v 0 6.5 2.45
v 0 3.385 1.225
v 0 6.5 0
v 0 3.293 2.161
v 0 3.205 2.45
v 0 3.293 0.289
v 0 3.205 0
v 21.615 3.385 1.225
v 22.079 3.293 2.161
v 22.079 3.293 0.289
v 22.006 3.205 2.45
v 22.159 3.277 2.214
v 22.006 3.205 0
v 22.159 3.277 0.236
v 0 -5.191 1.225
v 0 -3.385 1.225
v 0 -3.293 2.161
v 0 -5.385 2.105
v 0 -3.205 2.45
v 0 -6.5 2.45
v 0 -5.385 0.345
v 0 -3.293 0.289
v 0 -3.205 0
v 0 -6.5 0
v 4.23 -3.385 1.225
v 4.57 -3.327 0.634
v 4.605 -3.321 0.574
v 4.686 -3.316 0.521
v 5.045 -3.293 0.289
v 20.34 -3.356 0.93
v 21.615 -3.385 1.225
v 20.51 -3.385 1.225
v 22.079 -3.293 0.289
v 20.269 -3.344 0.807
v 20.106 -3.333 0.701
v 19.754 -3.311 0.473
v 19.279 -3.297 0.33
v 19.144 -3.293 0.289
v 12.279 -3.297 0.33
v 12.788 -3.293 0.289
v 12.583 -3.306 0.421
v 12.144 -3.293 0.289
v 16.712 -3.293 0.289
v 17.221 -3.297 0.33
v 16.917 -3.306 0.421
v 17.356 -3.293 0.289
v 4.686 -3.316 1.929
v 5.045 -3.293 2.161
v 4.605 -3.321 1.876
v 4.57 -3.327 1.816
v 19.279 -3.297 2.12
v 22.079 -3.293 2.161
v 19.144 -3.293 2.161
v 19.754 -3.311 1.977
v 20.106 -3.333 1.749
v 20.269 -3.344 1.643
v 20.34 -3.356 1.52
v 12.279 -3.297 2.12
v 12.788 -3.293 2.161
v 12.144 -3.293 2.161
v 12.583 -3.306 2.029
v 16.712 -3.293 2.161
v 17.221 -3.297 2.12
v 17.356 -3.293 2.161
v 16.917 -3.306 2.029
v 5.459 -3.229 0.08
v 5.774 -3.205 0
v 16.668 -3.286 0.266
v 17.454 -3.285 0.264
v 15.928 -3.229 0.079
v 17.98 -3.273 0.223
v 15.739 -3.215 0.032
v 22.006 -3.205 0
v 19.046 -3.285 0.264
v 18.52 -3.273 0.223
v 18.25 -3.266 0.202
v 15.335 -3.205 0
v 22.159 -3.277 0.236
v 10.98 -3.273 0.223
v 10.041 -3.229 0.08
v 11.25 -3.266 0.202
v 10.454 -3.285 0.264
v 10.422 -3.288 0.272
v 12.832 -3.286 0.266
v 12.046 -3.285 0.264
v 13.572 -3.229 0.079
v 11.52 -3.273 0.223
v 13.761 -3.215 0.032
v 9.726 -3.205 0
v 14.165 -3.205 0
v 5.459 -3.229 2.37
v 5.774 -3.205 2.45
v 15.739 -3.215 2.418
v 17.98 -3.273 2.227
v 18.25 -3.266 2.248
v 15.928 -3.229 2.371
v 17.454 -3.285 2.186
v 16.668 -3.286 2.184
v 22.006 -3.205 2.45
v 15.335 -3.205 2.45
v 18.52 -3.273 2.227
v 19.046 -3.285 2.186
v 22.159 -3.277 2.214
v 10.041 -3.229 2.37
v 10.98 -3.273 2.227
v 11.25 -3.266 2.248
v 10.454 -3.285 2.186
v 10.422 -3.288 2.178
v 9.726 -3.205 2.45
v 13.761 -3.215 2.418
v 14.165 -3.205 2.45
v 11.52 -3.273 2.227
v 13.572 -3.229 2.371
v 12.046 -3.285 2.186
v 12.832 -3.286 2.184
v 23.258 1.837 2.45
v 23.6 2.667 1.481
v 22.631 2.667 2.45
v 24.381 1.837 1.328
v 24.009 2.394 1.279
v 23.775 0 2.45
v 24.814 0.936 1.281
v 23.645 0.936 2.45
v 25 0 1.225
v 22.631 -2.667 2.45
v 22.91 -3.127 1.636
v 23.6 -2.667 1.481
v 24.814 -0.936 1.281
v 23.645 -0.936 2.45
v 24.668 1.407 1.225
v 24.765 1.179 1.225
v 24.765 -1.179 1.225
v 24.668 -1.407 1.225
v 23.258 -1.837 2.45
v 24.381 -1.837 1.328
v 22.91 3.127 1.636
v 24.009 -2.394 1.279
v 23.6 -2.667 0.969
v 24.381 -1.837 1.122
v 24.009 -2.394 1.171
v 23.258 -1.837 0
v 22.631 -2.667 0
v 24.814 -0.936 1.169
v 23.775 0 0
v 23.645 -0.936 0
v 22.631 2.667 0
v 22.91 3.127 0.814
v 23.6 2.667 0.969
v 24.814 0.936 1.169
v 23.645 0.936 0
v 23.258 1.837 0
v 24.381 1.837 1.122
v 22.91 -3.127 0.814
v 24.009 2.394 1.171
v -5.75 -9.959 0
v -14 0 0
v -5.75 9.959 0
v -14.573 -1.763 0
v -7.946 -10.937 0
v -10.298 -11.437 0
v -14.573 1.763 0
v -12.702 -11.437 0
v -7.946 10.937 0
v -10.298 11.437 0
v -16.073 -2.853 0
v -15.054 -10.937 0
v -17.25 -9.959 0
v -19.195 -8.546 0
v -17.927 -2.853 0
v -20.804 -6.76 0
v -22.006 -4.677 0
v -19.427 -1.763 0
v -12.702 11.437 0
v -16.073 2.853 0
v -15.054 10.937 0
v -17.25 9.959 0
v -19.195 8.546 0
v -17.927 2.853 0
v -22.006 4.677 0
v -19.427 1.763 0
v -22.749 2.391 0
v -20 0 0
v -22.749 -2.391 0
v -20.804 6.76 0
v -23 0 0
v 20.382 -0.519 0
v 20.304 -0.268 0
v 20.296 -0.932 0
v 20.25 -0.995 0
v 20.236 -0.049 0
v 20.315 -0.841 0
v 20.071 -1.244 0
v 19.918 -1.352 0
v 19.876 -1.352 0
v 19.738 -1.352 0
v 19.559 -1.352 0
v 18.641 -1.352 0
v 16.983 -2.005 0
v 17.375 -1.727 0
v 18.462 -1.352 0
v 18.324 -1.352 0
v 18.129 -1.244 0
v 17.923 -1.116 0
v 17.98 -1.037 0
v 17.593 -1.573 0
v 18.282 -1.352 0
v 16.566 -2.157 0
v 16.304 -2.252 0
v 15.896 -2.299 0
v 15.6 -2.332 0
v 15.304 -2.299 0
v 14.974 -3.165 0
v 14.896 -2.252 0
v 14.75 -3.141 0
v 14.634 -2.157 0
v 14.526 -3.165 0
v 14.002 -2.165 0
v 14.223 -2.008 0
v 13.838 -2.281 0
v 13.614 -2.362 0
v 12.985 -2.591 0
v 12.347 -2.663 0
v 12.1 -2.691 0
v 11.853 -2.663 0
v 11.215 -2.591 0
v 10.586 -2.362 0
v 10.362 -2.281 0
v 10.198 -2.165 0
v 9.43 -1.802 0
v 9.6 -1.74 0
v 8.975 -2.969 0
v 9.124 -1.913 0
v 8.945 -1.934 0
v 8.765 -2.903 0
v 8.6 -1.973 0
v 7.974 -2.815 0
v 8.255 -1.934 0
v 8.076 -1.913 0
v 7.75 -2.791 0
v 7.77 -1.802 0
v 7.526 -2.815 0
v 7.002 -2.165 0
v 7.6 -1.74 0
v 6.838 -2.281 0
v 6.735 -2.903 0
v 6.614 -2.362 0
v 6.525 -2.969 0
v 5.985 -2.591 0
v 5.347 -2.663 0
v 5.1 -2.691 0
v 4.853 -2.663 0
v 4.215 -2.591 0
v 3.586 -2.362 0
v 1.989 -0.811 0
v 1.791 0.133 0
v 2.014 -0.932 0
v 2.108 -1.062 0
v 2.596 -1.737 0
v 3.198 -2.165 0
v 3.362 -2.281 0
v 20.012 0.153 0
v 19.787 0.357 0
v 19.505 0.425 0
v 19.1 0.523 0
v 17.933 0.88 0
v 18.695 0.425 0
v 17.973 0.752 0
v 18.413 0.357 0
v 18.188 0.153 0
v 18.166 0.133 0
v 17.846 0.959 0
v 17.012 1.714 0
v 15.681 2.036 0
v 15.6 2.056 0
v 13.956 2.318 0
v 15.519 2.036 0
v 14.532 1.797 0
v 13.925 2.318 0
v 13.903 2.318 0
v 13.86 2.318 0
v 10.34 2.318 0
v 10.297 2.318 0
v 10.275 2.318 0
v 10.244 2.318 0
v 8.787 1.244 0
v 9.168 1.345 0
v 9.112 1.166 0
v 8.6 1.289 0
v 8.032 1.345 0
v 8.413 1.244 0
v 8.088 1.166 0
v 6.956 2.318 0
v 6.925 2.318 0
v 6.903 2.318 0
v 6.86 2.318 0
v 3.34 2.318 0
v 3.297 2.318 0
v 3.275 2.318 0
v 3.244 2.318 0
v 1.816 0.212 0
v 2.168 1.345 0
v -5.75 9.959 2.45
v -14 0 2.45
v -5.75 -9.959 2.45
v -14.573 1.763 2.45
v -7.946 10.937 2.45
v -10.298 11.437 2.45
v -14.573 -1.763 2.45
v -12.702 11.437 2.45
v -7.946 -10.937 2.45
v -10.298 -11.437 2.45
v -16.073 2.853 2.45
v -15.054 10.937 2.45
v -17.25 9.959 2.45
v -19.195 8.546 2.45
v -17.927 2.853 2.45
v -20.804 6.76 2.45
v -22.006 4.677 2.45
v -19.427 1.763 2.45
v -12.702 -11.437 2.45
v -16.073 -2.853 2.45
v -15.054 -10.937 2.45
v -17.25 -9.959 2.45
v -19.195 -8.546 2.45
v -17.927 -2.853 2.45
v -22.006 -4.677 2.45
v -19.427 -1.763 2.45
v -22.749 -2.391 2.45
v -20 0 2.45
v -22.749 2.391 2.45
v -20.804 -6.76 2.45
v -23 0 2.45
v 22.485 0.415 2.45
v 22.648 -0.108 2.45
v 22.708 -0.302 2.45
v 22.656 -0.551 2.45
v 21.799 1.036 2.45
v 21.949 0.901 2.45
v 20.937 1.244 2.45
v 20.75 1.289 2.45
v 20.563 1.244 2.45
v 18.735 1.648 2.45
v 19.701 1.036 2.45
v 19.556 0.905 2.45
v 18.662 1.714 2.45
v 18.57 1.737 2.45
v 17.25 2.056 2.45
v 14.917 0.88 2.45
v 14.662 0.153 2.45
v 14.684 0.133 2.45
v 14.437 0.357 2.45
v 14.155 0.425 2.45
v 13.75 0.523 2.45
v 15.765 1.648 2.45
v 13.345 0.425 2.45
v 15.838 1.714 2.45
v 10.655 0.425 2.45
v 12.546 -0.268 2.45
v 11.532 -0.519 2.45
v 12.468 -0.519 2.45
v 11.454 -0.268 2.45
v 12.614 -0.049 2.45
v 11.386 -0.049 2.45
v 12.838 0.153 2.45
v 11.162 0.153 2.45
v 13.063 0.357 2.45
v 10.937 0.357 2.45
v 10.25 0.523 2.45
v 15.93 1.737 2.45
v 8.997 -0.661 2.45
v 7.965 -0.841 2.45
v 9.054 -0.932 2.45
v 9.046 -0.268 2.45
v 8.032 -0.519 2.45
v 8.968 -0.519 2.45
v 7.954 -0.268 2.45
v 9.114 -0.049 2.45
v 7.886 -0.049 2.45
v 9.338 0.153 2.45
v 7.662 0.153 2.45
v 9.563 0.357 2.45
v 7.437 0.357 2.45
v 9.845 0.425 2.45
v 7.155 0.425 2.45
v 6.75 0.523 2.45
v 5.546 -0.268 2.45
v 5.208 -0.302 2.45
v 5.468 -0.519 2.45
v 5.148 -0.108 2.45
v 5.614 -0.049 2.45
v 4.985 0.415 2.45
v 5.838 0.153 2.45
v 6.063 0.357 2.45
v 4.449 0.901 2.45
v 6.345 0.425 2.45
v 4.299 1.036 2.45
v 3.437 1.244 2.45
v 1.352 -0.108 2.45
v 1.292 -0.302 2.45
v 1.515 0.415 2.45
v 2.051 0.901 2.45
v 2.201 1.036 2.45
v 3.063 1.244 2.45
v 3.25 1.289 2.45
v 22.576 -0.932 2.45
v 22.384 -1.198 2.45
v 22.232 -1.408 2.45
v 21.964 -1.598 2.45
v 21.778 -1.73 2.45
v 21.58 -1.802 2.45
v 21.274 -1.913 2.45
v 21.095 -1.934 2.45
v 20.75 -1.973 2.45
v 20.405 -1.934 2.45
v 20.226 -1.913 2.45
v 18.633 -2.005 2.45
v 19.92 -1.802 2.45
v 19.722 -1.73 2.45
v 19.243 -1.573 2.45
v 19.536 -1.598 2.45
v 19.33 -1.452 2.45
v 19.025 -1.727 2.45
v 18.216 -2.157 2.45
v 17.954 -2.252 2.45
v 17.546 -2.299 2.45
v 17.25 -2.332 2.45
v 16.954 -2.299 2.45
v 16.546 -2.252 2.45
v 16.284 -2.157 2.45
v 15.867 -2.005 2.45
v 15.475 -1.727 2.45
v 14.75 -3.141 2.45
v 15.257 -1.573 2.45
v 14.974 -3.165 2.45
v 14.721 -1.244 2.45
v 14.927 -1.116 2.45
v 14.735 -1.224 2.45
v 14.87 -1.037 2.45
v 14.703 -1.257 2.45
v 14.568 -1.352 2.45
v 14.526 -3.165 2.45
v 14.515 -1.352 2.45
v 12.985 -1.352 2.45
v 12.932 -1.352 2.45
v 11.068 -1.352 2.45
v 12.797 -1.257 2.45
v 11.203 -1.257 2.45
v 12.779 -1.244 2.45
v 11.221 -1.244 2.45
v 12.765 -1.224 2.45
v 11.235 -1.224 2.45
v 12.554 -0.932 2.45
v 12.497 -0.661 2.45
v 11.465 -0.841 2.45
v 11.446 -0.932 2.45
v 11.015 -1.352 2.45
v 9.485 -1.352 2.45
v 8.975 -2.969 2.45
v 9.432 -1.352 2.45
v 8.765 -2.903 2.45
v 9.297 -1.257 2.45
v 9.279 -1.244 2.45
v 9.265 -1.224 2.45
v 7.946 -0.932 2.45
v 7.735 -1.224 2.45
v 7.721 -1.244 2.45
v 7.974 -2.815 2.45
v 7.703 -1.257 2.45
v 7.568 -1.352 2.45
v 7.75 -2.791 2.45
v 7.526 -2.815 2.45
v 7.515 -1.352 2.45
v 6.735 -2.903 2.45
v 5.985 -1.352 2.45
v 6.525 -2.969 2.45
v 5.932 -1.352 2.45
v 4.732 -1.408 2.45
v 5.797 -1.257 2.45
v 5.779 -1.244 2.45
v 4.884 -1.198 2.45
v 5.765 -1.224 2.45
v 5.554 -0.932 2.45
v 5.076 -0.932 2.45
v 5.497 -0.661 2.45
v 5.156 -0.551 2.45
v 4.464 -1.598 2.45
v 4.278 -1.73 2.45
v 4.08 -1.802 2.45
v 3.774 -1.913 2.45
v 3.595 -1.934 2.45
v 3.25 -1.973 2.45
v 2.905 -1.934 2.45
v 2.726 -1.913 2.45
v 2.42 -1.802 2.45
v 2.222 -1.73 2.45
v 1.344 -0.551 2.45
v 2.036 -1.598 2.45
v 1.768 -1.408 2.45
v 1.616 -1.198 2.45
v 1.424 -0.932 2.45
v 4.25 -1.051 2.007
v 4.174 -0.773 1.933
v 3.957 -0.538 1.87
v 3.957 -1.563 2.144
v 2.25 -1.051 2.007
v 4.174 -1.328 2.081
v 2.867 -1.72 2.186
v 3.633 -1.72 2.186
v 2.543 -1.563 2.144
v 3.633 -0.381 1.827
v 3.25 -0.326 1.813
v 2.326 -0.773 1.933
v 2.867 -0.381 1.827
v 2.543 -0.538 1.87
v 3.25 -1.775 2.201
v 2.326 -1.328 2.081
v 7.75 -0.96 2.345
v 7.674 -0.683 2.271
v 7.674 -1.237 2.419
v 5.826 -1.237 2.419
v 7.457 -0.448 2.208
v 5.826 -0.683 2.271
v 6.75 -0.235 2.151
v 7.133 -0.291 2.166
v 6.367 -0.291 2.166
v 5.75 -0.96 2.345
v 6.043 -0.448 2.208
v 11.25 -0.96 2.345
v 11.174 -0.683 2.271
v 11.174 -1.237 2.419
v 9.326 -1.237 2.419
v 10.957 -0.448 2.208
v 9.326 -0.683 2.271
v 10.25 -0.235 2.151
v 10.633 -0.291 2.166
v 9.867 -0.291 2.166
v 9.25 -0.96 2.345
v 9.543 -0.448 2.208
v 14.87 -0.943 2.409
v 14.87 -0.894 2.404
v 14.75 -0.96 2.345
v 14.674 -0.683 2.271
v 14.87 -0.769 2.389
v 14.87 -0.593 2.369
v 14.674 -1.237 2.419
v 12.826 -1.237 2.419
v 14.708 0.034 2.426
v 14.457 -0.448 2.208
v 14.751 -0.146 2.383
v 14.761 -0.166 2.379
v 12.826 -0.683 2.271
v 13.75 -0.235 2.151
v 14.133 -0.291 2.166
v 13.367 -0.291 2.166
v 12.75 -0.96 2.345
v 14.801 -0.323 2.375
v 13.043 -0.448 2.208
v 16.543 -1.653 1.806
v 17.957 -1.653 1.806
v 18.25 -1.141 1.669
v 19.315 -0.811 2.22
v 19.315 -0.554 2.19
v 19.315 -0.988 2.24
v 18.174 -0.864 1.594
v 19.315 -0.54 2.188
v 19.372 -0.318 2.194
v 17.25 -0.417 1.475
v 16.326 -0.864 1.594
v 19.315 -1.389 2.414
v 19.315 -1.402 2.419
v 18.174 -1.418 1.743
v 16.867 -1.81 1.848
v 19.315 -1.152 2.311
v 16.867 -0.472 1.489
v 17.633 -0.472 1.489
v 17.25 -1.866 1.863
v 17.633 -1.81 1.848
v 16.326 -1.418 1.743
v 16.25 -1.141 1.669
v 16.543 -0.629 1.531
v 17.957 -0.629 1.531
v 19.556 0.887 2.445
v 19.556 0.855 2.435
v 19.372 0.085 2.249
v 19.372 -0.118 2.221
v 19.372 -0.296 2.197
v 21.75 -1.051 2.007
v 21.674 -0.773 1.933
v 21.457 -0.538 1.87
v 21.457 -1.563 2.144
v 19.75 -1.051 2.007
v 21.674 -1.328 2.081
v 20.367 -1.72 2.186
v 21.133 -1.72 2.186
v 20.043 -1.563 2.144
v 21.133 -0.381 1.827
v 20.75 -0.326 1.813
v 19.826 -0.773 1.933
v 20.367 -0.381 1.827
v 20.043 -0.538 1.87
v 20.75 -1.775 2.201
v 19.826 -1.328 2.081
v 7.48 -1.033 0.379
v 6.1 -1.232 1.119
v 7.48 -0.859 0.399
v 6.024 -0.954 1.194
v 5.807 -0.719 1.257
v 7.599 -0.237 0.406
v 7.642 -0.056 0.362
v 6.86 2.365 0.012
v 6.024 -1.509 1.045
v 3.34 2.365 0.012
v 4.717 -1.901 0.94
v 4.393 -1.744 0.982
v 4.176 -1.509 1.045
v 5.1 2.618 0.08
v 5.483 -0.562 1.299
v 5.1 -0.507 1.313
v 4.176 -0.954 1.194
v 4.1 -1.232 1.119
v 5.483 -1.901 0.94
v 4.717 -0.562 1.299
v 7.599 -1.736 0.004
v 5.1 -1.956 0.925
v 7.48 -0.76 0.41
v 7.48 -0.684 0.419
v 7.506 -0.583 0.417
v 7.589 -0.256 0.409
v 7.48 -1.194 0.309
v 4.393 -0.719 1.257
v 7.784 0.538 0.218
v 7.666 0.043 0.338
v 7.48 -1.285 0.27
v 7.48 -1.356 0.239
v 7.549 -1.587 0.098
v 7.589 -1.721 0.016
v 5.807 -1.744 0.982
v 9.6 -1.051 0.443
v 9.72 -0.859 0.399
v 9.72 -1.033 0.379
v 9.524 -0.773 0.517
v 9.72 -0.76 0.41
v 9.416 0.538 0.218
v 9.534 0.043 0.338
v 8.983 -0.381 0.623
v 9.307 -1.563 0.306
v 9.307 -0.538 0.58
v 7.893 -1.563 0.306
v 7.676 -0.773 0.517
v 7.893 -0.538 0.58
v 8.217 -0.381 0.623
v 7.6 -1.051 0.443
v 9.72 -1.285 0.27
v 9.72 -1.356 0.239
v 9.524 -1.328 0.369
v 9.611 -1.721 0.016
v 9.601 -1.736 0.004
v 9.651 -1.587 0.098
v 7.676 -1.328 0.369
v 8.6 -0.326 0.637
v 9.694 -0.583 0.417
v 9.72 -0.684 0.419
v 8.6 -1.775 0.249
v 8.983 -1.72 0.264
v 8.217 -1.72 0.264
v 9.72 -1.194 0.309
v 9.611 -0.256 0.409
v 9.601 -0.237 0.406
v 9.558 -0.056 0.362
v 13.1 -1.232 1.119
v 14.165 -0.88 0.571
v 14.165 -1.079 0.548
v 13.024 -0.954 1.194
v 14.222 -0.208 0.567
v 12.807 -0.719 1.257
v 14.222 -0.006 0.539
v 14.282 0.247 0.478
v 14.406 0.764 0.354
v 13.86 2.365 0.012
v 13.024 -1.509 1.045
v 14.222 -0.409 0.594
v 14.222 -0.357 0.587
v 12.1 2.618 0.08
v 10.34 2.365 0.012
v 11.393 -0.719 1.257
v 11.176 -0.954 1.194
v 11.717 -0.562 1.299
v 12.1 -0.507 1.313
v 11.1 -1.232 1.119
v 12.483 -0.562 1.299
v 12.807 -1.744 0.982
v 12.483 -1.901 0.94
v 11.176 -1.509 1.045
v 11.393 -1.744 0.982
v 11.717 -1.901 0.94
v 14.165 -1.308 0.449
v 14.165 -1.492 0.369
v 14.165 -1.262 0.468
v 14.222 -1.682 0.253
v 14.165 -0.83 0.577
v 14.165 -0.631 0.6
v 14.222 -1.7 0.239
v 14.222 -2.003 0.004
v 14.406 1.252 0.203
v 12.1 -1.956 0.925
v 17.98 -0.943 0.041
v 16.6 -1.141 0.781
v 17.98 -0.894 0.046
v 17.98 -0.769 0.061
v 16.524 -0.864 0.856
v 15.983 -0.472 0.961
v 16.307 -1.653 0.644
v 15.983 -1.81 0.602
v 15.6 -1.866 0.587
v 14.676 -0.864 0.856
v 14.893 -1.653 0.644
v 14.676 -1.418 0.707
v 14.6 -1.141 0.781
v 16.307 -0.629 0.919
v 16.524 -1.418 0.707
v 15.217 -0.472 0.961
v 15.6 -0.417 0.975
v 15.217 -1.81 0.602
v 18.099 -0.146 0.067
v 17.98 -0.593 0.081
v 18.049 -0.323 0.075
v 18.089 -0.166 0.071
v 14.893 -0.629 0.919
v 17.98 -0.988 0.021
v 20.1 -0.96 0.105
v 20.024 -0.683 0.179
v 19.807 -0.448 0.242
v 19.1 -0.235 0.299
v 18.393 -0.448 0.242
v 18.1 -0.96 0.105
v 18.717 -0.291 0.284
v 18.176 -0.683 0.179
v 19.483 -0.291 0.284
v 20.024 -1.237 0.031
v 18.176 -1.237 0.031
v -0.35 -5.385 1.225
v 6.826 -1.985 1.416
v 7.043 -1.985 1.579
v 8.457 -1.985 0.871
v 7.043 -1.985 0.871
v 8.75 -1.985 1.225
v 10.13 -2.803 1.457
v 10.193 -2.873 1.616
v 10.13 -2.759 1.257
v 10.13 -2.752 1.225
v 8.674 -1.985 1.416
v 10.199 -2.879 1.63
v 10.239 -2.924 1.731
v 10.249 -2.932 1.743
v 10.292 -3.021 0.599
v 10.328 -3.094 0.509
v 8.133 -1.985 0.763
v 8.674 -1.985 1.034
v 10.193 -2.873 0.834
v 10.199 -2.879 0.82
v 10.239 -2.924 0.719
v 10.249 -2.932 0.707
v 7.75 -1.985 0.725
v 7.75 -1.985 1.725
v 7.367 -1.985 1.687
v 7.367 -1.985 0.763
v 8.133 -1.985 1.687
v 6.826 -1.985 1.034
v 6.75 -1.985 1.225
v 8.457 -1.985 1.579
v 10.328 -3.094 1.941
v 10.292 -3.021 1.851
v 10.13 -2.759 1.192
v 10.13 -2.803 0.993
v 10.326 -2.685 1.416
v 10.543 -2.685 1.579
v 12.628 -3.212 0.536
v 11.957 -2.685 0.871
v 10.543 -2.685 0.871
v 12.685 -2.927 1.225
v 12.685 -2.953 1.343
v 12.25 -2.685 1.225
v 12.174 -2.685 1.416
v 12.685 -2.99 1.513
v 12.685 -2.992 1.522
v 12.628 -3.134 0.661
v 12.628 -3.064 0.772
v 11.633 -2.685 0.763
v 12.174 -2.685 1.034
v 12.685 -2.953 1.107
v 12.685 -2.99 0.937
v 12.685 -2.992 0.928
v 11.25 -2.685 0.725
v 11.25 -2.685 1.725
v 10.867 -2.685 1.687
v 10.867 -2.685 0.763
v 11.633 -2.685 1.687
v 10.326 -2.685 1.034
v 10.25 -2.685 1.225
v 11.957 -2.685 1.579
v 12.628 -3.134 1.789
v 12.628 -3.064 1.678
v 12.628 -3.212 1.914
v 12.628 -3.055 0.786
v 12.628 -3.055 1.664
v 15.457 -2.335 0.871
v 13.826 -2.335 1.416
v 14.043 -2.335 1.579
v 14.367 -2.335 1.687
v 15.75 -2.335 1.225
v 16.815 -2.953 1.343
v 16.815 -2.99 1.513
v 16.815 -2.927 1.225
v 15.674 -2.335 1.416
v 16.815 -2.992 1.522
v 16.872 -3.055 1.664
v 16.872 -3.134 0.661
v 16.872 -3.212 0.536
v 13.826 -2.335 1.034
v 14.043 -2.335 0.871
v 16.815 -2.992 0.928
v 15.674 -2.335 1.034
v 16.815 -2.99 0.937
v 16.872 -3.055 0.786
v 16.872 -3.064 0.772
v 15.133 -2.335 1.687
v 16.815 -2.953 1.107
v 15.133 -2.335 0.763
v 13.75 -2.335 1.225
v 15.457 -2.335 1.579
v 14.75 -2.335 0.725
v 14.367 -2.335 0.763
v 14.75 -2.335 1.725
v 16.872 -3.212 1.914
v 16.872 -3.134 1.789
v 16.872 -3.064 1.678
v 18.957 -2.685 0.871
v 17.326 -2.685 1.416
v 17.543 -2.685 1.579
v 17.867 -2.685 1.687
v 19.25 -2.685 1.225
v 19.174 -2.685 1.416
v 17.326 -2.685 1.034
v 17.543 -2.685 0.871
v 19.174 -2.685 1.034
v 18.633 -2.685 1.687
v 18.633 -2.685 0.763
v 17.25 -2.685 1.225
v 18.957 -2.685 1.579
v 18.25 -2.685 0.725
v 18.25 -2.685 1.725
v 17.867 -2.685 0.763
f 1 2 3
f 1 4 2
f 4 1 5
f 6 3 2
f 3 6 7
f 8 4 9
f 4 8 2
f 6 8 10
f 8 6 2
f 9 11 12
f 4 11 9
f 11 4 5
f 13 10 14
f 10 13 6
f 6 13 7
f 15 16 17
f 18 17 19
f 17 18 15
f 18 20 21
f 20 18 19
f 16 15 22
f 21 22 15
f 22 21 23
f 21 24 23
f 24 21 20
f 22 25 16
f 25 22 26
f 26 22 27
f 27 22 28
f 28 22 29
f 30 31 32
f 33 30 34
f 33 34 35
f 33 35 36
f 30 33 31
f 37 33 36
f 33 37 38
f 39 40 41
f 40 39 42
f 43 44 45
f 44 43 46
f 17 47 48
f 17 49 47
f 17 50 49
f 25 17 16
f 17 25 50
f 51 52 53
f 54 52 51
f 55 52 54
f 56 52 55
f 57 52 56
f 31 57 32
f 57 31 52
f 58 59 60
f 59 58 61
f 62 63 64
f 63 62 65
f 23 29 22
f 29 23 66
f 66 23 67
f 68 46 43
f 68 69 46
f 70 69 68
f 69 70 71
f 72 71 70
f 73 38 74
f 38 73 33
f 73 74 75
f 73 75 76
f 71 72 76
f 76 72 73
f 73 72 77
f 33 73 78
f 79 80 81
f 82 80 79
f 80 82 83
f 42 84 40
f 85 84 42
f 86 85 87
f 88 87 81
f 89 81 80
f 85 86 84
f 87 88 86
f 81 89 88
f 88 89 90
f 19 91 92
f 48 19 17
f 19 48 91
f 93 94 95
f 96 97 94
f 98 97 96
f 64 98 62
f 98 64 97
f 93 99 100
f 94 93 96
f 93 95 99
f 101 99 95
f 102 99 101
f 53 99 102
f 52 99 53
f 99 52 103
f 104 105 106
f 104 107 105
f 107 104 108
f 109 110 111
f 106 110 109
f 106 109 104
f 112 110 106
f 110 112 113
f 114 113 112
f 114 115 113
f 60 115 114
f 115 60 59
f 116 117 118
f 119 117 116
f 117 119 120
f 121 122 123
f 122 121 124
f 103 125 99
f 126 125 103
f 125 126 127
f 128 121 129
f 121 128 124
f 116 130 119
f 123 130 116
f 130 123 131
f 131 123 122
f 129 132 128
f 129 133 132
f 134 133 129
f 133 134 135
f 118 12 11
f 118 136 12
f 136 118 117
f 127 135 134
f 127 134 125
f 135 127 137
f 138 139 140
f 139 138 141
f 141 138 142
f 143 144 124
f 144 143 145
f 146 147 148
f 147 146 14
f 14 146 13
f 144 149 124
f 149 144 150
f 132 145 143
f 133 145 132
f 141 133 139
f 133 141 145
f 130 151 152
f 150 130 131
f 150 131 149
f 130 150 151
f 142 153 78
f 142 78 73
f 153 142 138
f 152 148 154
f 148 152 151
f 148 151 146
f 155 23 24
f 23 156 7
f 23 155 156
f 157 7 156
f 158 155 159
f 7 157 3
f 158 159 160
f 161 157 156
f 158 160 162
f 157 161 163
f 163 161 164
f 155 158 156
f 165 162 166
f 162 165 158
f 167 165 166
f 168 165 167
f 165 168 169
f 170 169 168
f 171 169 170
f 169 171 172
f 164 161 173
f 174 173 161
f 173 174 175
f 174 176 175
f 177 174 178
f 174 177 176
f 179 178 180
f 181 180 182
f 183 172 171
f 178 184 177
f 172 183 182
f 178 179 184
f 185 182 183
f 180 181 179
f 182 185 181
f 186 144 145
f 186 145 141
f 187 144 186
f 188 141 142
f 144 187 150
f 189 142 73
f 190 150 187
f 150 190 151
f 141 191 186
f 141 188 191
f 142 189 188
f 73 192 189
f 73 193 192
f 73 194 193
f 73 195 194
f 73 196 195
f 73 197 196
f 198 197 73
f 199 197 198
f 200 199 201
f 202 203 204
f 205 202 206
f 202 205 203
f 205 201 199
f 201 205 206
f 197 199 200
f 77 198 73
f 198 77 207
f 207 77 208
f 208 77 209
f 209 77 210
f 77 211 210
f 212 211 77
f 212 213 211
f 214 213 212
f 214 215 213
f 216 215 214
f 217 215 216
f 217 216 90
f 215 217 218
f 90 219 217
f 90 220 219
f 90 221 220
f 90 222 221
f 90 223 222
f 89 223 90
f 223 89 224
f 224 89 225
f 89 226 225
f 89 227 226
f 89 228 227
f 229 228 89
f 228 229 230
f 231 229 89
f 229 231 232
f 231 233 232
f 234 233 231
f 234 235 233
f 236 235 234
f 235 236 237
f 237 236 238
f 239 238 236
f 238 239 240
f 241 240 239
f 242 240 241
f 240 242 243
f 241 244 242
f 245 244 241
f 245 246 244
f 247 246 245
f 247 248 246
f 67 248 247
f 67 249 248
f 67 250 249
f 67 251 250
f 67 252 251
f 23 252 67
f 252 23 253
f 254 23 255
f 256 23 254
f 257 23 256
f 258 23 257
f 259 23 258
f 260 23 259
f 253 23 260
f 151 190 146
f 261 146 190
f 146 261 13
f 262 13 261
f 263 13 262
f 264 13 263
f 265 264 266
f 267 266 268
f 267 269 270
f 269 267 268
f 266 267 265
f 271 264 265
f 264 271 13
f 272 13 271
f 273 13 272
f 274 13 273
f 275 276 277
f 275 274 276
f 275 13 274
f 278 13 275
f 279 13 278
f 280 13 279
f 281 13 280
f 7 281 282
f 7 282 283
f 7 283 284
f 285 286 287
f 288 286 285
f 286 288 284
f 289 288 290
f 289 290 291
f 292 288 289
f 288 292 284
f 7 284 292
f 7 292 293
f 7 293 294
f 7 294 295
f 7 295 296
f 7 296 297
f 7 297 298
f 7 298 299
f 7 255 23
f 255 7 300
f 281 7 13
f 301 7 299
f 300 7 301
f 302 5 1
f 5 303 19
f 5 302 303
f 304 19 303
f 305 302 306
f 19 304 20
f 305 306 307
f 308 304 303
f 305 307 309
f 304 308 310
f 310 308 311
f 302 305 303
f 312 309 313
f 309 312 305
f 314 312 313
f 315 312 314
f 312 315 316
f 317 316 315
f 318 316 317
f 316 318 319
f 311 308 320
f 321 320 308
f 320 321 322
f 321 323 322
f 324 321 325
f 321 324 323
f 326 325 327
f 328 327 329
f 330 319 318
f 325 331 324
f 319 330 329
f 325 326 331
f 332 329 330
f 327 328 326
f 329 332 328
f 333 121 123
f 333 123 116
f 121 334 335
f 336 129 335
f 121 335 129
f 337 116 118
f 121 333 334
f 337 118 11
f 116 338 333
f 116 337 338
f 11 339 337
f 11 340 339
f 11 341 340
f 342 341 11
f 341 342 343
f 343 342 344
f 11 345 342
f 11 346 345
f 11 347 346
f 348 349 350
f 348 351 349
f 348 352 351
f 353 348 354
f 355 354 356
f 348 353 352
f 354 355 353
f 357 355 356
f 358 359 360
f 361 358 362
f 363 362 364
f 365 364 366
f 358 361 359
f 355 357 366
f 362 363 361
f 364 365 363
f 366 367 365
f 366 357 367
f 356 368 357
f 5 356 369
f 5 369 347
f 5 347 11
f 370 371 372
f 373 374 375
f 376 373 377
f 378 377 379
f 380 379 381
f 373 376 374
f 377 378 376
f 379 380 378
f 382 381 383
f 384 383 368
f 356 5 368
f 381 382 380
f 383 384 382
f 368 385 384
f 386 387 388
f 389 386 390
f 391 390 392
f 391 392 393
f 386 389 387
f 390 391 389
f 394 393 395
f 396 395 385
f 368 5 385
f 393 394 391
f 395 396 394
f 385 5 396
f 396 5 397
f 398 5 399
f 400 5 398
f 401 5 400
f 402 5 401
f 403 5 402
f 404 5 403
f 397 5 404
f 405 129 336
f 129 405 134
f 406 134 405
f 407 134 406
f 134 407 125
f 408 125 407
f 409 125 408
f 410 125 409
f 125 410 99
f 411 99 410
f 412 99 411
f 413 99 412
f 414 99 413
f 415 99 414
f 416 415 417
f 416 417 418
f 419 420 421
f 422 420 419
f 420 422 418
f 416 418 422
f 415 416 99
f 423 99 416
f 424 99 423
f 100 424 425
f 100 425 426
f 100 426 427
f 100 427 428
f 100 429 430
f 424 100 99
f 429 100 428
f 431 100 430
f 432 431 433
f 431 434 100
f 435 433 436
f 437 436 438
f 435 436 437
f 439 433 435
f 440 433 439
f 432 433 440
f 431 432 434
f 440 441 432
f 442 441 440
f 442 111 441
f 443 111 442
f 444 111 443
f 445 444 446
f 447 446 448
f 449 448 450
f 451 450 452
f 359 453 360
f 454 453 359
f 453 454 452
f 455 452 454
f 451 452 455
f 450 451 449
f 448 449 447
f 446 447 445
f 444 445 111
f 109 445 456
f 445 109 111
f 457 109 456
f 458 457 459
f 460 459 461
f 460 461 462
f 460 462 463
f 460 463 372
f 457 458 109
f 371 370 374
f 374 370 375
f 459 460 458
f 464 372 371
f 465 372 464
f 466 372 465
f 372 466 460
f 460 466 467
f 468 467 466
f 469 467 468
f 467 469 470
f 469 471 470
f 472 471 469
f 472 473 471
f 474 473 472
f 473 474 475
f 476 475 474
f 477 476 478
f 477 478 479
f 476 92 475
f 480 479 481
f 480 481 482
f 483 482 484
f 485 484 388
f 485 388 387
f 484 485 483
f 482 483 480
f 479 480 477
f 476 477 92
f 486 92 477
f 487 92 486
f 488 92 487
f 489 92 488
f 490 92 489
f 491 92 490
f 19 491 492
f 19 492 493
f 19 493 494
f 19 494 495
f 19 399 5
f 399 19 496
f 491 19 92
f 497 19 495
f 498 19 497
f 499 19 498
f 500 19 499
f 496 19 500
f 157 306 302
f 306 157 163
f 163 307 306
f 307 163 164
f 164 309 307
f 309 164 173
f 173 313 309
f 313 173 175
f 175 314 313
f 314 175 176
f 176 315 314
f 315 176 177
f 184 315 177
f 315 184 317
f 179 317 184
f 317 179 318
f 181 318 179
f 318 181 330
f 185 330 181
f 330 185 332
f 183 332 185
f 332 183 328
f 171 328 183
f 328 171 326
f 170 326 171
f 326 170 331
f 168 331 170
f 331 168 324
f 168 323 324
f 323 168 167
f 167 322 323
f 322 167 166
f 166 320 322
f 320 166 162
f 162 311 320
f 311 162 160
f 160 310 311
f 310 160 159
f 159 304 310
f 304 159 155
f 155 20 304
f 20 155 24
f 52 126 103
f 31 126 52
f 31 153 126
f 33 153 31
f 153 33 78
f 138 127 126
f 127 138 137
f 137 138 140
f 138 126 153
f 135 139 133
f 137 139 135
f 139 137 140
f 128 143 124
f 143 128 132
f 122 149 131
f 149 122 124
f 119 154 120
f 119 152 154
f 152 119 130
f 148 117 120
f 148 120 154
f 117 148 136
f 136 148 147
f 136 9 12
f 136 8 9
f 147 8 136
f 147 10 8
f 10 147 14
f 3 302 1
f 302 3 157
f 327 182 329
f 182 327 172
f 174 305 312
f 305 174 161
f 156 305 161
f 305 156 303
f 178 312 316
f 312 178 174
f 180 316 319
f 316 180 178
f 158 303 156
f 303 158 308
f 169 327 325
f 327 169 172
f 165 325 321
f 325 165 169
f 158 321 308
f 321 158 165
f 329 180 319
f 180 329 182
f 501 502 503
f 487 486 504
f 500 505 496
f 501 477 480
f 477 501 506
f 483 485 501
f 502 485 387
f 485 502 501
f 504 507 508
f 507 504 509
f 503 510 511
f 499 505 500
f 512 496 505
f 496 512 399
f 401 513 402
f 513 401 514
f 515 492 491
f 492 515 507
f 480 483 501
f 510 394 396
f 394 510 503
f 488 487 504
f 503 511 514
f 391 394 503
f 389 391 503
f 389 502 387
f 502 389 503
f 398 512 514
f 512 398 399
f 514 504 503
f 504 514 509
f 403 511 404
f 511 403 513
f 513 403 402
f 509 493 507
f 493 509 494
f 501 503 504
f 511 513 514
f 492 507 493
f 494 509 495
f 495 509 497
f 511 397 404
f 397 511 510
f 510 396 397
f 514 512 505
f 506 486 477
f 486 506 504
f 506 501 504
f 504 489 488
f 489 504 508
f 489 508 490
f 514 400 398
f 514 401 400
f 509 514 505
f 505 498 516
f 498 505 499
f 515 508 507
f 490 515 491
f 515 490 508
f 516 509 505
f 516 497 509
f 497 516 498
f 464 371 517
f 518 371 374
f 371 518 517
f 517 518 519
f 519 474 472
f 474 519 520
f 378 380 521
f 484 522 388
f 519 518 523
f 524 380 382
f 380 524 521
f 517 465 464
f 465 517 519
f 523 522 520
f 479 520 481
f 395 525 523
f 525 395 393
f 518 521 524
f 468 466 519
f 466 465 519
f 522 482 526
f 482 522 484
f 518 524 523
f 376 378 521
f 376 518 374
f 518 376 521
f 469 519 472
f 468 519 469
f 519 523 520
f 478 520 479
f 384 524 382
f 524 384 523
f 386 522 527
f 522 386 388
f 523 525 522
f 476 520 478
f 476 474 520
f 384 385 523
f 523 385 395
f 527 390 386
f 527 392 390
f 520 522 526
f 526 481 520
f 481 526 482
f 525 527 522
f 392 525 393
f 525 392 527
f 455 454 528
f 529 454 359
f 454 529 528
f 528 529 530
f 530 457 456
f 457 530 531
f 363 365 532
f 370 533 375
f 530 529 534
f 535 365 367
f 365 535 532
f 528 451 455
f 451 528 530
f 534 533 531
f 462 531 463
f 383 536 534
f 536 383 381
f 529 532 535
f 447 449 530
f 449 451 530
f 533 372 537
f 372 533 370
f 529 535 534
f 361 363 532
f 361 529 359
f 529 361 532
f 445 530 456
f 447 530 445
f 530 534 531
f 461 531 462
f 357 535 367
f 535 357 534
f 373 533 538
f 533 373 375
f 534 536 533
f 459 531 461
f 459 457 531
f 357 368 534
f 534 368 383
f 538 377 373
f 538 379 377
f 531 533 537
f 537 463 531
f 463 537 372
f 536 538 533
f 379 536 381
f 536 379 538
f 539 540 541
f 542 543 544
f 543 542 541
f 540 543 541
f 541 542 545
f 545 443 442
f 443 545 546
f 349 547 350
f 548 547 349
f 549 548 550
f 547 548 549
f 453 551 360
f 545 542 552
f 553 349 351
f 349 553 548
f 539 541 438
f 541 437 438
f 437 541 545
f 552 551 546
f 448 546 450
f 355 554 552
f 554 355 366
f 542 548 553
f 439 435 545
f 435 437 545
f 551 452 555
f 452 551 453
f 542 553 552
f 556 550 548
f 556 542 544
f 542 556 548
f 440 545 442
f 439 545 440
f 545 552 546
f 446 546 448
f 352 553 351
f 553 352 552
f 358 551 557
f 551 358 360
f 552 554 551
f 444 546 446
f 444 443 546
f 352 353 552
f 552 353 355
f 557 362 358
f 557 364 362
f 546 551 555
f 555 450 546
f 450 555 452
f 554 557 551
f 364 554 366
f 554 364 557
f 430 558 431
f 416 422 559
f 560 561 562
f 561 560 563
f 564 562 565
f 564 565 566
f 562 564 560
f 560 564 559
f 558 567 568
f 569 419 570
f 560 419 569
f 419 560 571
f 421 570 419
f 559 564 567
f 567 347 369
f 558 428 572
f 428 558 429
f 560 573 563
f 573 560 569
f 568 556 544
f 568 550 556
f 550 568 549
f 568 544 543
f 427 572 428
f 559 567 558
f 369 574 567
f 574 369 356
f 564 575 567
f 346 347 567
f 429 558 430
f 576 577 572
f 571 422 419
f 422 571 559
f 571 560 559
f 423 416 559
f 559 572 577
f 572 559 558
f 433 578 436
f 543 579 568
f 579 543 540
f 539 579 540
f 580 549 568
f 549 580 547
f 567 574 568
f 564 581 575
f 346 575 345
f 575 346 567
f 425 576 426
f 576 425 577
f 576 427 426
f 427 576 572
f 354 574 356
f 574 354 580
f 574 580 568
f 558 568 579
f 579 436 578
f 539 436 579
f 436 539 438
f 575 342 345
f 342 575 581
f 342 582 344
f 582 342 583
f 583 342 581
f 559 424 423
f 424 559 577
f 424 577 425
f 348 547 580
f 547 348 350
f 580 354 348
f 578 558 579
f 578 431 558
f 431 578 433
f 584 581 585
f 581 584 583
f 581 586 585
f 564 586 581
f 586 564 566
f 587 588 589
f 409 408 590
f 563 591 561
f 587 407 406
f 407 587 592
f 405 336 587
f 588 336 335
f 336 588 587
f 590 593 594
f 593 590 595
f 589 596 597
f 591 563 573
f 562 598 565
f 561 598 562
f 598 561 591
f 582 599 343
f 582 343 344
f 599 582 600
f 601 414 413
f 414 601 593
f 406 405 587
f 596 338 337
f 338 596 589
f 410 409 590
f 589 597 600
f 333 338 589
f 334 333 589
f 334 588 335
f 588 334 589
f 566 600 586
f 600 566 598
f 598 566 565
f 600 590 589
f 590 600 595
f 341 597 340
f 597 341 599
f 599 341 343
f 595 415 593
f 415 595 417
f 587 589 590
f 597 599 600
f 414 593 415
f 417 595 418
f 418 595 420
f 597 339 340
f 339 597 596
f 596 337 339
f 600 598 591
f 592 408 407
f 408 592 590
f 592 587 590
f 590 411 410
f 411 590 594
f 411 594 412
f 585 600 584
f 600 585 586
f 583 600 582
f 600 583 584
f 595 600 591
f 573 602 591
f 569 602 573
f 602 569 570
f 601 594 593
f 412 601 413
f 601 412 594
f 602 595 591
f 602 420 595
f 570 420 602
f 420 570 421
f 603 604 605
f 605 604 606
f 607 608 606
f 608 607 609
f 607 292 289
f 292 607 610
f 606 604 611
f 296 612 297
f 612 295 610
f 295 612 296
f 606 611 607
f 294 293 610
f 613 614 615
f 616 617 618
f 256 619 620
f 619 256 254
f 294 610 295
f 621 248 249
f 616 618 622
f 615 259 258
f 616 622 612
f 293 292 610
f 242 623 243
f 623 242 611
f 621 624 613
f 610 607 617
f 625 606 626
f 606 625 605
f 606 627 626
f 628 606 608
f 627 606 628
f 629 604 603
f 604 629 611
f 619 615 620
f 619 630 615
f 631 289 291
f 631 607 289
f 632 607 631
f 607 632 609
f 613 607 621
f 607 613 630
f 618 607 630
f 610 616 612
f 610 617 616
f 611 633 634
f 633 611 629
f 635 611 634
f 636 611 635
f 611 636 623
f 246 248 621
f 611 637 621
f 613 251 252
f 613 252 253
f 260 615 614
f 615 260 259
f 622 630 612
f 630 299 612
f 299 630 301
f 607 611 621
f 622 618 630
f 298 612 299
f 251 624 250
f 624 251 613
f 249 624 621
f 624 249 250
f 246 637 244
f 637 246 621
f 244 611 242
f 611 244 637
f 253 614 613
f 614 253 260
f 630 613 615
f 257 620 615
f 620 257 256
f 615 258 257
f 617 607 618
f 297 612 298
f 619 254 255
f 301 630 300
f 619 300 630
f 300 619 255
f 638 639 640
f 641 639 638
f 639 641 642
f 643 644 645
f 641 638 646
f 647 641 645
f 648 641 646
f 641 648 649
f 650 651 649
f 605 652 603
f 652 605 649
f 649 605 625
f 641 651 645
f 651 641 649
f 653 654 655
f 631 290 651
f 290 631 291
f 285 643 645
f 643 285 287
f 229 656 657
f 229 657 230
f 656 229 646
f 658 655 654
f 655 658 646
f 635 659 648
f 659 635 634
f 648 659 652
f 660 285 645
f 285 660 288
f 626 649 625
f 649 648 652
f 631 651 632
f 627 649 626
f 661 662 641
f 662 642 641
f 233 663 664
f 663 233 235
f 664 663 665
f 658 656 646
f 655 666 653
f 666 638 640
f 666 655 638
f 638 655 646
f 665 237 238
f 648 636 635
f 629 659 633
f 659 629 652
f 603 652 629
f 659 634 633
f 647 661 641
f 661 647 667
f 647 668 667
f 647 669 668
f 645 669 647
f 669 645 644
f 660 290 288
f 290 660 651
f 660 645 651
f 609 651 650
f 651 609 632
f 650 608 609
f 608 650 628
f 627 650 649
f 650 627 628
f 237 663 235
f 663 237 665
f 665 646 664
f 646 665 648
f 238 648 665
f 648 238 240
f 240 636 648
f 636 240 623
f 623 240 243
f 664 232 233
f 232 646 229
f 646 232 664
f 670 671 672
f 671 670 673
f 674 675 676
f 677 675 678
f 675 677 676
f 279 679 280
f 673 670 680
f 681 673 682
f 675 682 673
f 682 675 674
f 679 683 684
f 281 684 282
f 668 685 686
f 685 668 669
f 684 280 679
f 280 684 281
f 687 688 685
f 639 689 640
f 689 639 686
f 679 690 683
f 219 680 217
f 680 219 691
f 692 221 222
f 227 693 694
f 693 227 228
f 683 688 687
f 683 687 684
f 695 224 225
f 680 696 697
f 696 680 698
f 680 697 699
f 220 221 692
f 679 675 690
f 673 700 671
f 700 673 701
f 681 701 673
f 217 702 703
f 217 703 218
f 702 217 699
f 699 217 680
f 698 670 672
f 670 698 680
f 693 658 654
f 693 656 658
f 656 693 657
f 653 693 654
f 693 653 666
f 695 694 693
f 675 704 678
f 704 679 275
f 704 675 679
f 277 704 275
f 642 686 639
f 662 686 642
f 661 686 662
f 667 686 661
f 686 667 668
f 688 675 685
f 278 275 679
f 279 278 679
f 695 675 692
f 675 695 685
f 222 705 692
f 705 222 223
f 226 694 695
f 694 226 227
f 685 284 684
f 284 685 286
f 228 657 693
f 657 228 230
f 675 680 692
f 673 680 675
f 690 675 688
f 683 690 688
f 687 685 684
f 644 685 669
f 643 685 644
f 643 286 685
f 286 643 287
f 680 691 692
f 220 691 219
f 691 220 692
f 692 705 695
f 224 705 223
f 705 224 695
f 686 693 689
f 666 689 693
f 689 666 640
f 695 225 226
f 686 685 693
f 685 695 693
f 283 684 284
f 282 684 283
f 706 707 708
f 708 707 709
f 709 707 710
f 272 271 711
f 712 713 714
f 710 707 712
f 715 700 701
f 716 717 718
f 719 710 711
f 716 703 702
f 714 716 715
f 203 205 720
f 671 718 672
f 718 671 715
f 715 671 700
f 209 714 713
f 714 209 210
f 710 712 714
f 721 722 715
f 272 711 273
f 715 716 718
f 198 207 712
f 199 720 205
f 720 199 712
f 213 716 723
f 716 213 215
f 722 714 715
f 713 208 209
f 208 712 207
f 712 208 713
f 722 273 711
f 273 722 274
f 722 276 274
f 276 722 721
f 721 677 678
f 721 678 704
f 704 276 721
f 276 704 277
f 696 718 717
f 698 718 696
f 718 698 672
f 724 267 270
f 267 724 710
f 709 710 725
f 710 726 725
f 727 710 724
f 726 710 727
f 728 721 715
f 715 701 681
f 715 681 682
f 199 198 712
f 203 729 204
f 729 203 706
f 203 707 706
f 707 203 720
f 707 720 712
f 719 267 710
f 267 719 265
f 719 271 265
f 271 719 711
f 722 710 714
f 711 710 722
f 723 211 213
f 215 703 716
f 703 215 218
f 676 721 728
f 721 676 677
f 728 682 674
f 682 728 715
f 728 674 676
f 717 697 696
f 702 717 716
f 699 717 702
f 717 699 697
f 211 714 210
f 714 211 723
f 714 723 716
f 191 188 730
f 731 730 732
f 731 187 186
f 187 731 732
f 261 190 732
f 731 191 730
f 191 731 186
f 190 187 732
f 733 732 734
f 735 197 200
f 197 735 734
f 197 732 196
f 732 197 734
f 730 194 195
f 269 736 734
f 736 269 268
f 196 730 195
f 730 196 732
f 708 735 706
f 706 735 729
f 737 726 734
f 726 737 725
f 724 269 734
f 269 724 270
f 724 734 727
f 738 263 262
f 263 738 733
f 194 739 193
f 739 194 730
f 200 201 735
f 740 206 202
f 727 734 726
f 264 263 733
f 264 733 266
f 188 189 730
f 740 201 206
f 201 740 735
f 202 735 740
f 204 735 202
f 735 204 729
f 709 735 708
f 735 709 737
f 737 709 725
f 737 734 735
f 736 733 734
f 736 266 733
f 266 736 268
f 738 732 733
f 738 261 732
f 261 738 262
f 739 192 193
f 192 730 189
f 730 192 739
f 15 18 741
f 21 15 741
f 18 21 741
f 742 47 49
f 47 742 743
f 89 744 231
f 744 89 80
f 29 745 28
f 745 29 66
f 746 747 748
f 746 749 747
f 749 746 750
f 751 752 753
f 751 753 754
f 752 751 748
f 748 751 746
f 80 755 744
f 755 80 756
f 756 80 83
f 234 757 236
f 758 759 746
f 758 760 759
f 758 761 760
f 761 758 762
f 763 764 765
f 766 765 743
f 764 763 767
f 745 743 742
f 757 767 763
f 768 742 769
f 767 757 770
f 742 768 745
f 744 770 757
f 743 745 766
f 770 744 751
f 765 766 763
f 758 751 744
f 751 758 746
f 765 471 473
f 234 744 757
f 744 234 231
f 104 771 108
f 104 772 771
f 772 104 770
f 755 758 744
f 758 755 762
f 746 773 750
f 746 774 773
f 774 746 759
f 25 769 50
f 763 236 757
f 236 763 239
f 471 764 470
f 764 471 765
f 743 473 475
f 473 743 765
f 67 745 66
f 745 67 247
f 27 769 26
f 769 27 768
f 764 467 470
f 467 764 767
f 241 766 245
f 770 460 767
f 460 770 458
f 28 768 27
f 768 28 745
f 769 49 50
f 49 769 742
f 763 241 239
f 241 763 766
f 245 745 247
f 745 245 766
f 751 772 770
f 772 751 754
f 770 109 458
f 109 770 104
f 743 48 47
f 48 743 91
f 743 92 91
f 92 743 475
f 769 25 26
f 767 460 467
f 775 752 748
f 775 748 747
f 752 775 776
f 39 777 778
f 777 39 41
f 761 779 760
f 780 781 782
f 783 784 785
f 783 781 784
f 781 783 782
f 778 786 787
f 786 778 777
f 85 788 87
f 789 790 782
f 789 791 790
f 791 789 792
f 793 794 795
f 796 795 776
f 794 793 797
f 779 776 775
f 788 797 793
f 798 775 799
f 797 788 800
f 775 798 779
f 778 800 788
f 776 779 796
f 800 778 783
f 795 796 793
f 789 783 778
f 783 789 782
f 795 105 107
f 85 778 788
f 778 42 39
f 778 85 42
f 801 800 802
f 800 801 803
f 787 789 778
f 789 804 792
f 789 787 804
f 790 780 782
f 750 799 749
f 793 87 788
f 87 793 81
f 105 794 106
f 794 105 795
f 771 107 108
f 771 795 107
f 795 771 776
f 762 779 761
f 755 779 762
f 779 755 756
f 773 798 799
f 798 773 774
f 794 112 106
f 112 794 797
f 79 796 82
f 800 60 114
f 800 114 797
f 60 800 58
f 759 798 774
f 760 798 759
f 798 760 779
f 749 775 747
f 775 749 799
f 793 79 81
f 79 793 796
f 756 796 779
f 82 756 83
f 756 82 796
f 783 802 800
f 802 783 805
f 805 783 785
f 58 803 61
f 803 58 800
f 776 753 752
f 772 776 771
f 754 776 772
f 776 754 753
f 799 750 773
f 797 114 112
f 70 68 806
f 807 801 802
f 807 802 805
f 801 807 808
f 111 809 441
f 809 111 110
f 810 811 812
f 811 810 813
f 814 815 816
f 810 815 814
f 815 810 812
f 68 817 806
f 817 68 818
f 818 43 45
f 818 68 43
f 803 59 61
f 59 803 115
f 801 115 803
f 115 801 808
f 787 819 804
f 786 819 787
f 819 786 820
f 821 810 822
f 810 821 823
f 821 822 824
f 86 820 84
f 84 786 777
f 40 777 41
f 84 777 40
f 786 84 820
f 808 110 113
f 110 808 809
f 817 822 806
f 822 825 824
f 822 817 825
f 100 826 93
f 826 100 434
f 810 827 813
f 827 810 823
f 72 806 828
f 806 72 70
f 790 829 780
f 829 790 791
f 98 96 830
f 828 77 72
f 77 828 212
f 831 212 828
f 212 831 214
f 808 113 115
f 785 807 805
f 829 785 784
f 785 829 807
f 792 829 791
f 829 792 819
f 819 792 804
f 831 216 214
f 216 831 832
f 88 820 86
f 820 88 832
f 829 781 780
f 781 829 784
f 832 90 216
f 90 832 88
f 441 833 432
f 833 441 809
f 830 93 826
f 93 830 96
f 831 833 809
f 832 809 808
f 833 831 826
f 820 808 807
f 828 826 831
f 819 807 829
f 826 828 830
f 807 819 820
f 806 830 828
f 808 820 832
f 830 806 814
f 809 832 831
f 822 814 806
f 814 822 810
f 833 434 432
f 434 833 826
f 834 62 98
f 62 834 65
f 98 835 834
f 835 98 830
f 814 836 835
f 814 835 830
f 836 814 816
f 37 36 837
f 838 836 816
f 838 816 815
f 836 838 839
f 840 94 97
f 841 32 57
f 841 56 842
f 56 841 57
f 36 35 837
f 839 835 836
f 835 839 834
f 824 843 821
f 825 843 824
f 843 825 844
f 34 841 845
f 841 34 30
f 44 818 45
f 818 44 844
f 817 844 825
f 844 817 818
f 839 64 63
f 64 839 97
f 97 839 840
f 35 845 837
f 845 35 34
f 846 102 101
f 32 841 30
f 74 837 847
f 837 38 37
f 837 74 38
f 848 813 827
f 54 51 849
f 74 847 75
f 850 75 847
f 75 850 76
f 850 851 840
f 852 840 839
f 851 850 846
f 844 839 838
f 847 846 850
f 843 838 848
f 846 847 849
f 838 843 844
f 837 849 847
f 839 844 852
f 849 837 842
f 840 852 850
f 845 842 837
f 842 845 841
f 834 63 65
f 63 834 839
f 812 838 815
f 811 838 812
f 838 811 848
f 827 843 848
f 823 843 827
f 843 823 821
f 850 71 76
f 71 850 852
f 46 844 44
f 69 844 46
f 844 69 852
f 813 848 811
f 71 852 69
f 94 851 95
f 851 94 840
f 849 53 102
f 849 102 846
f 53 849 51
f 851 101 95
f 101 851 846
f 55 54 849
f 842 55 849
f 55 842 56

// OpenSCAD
// Physical Keygen - by Nirav Patel <http://eclecti.cc>
//
// Generate a duplicate of an ABUS Plus key by editing the last line of the file
// and entering in the key code of the lock.  If you don't know the key code,
// you're going to need to get creative.  The first digit of the code is on the
// side closest to the shoulder. 6 is the minimum cut, which is uncut. 1 (0?)
// is the maximum cut.
//
// This work is licensed under a Creative Commons Attribution 3.0 Unported License.

module key_profile(width, length) {
    union() {
        // Handle
        hull() {
            translate([-11.5, 0, 0]) circle(r=11.5);
            translate([-10.0, -6.5, 0]) square([10.0, 13.0]);
        }
        // Blade
        hull() {
            translate([length-width/2, 0, 0]) circle(r=width/2, $fn=16);
            translate([0, -width/2, 0]) square([length-width/2, width]);
        }
    }
}

module rounded_edge(length, diameter) {
    difference() {
        translate([0, -diameter/2, -diameter]) cube([length, diameter, diameter]);
        rotate([0, 90, 0]) cylinder(h=length, r=diameter/2, $fn=32);
    }
}

module blank(width, length, thickness) {
    c_d = 9.6; // lock cylinder diameter

    difference() {
        linear_extrude(height=thickness, center=false, convexity=10, twist=0) key_profile(width, length);
        // key ring hole
        translate([-17, 0, -1]) cylinder(r=3,h=thickness+2);
        // round the edges
        translate([0, -c_d/2+width/2, thickness/2]) rotate([90, 0, 0]) rounded_edge(length, c_d);
        translate([0, c_d/2-width/2, thickness/2]) rotate([-90, 0, 0]) rounded_edge(length, c_d);
        // round the tip
        translate([length, 0, thickness/2]) rotate([0, 225, 0]) translate([0, 0, c_d/2]) rounded_edge(length, c_d);
        rotate([180, 0, 0]) translate([length, 0, -thickness/2]) rotate([0, 225, 0]) translate([0, 0, c_d/2]) rounded_edge(length, c_d);
    }
}

module bit() {
    scale([2, 1, 1]) cylinder(h=2, r1=0.5, r2=2.3, $fn=16);
}

module wbit() {
    scale([1, 1.5, 1]) bit();
}

module kaba_gemini(left, right, edge) {
    
    thickness = 2.45;
    width = 6.77;
    length = 25;
    offset = 0.9;
    spacing = 3.5;
    
    difference() {
        blank(width, length, thickness);
        for (i = [0:5]) {
            translate([0, 0, thickness]) rotate([-15, 0, 0]) translate([3.25+i*spacing, -offset, -(5-left[i])*0.35]) wbit();
        }
        for (i = [0:4]) {
            mirror([0, 0, 1]) rotate([-15, 0, 0]) translate([5.1+i*spacing, -offset, -(5-right[i])*0.35]) wbit();
        }
        for (i = [0:9]) {
            translate([4.25+i*spacing/2, -width/2+(5-edge[i])*0.35, thickness/2]) rotate([90, 0, 0]) bit();
        }
    }
}

kaba_gemini([3,4,4,4,2,3],[1,3,1,2,4],[5,5,1,5,3,5,2,5,3,5]);
